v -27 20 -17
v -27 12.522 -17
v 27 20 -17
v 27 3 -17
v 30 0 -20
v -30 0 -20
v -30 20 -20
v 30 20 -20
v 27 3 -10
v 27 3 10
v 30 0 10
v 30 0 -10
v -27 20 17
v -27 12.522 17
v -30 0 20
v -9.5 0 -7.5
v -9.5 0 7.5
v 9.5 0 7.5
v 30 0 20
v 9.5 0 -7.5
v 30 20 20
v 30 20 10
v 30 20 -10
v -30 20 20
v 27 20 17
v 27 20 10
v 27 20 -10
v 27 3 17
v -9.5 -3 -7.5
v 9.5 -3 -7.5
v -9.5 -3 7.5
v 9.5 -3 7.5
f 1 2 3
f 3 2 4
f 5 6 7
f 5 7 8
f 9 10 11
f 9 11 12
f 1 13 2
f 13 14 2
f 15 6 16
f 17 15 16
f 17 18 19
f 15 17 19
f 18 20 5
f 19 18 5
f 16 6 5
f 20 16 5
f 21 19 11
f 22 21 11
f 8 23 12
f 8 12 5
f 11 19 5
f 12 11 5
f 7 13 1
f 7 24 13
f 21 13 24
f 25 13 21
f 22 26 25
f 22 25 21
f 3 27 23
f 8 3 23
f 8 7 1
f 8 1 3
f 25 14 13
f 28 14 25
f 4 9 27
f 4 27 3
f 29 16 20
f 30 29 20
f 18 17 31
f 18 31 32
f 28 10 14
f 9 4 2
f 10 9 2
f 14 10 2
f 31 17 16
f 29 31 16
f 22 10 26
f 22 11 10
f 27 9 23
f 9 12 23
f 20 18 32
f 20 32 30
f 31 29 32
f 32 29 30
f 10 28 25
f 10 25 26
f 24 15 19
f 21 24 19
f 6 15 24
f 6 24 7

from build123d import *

# Parameters (mm, degrees)
SKETCH1_W           = 60
SKETCH1_H           = 40
SKETCH1_W_2         = 19
SKETCH1_H_2         = 15
BOSS_EXTRUDE1_DEPTH = 20
SHELL2_T            = -3
SKETCH1_3_W         = 19
SKETCH1_3_H         = 15
BOSS_EXTRUDE2_DEPTH = 3
SKETCH2_W           = 20
SKETCH2_H           = 17
CUT_EXTRUDE1_DEPTH  = 3
CHAMFER1_SIZE       = 3
BOSS_EXTRUDE3_REACH = 53.662


with BuildPart() as part:
    # Sketch1 → Boss-Extrude1 (new body)
    # profile 1 of 2: a face of its own
    with BuildSketch(Plane(origin=(0, 0, 0), x_dir=(1, 0, 0), z_dir=(0, 1, 0))):
        Rectangle(SKETCH1_W, SKETCH1_H)
        Rectangle(SKETCH1_W_2, SKETCH1_H_2, mode=Mode.SUBTRACT)
    # profile 2 of 2: a face of its own
    with BuildSketch(Plane(origin=(0, 0, 0), x_dir=(1, 0, 0), z_dir=(0, 1, 0))):
        Rectangle(SKETCH1_W_2, SKETCH1_H_2)
    extrude(amount=BOSS_EXTRUDE1_DEPTH)

    # Shell2
    shell2_openings = [part.faces().sort_by_distance(p)[0] for p in [
        (0, 20, 0),
    ]]
    offset(amount=SHELL2_T, openings=shell2_openings, kind=Kind.INTERSECTION)

    # Sketch1<3> → Boss-Extrude2 (add)
    with BuildSketch(Plane(origin=(0, 0, 0), x_dir=(1, 0, 0), z_dir=(0, 1, 0))):
        Rectangle(SKETCH1_3_W, SKETCH1_3_H)
    extrude(amount=-BOSS_EXTRUDE2_DEPTH)

    # Sketch2 → Cut-Extrude1 (cut)
    with BuildSketch(Plane(origin=(30, 0, 0), x_dir=(0, 0, -1), z_dir=(1, 0, 0))):
        with Locations((0, 11.5)):
            Rectangle(SKETCH2_W, SKETCH2_H)
    extrude(amount=-CUT_EXTRUDE1_DEPTH, mode=Mode.SUBTRACT)

    # Chamfer1
    chamfer1_edges = [part.edges().sort_by_distance(p)[0] for p in [
        (30, 3, 0),
    ]]
    chamfer(chamfer1_edges, length=CHAMFER1_SIZE - 0.0001)  # a hair under: the kernel refuses the full size

    # Sketch3 → Boss-Extrude3 (add, up to next)
    with BuildSketch(Plane.XY.offset(-17), mode=Mode.PRIVATE) as boss_extrude3_sk1:
        Polygon((-27, 3), (27, 3), (-27, 12.521656958), align=None)
    boss_extrude3_tool1 = extrude(boss_extrude3_sk1.sketch, amount=BOSS_EXTRUDE3_REACH, mode=Mode.PRIVATE) - part.part
    add(boss_extrude3_tool1.solids().sort_by_distance((-9, 6.173886, -17))[0])


solid = part.part
